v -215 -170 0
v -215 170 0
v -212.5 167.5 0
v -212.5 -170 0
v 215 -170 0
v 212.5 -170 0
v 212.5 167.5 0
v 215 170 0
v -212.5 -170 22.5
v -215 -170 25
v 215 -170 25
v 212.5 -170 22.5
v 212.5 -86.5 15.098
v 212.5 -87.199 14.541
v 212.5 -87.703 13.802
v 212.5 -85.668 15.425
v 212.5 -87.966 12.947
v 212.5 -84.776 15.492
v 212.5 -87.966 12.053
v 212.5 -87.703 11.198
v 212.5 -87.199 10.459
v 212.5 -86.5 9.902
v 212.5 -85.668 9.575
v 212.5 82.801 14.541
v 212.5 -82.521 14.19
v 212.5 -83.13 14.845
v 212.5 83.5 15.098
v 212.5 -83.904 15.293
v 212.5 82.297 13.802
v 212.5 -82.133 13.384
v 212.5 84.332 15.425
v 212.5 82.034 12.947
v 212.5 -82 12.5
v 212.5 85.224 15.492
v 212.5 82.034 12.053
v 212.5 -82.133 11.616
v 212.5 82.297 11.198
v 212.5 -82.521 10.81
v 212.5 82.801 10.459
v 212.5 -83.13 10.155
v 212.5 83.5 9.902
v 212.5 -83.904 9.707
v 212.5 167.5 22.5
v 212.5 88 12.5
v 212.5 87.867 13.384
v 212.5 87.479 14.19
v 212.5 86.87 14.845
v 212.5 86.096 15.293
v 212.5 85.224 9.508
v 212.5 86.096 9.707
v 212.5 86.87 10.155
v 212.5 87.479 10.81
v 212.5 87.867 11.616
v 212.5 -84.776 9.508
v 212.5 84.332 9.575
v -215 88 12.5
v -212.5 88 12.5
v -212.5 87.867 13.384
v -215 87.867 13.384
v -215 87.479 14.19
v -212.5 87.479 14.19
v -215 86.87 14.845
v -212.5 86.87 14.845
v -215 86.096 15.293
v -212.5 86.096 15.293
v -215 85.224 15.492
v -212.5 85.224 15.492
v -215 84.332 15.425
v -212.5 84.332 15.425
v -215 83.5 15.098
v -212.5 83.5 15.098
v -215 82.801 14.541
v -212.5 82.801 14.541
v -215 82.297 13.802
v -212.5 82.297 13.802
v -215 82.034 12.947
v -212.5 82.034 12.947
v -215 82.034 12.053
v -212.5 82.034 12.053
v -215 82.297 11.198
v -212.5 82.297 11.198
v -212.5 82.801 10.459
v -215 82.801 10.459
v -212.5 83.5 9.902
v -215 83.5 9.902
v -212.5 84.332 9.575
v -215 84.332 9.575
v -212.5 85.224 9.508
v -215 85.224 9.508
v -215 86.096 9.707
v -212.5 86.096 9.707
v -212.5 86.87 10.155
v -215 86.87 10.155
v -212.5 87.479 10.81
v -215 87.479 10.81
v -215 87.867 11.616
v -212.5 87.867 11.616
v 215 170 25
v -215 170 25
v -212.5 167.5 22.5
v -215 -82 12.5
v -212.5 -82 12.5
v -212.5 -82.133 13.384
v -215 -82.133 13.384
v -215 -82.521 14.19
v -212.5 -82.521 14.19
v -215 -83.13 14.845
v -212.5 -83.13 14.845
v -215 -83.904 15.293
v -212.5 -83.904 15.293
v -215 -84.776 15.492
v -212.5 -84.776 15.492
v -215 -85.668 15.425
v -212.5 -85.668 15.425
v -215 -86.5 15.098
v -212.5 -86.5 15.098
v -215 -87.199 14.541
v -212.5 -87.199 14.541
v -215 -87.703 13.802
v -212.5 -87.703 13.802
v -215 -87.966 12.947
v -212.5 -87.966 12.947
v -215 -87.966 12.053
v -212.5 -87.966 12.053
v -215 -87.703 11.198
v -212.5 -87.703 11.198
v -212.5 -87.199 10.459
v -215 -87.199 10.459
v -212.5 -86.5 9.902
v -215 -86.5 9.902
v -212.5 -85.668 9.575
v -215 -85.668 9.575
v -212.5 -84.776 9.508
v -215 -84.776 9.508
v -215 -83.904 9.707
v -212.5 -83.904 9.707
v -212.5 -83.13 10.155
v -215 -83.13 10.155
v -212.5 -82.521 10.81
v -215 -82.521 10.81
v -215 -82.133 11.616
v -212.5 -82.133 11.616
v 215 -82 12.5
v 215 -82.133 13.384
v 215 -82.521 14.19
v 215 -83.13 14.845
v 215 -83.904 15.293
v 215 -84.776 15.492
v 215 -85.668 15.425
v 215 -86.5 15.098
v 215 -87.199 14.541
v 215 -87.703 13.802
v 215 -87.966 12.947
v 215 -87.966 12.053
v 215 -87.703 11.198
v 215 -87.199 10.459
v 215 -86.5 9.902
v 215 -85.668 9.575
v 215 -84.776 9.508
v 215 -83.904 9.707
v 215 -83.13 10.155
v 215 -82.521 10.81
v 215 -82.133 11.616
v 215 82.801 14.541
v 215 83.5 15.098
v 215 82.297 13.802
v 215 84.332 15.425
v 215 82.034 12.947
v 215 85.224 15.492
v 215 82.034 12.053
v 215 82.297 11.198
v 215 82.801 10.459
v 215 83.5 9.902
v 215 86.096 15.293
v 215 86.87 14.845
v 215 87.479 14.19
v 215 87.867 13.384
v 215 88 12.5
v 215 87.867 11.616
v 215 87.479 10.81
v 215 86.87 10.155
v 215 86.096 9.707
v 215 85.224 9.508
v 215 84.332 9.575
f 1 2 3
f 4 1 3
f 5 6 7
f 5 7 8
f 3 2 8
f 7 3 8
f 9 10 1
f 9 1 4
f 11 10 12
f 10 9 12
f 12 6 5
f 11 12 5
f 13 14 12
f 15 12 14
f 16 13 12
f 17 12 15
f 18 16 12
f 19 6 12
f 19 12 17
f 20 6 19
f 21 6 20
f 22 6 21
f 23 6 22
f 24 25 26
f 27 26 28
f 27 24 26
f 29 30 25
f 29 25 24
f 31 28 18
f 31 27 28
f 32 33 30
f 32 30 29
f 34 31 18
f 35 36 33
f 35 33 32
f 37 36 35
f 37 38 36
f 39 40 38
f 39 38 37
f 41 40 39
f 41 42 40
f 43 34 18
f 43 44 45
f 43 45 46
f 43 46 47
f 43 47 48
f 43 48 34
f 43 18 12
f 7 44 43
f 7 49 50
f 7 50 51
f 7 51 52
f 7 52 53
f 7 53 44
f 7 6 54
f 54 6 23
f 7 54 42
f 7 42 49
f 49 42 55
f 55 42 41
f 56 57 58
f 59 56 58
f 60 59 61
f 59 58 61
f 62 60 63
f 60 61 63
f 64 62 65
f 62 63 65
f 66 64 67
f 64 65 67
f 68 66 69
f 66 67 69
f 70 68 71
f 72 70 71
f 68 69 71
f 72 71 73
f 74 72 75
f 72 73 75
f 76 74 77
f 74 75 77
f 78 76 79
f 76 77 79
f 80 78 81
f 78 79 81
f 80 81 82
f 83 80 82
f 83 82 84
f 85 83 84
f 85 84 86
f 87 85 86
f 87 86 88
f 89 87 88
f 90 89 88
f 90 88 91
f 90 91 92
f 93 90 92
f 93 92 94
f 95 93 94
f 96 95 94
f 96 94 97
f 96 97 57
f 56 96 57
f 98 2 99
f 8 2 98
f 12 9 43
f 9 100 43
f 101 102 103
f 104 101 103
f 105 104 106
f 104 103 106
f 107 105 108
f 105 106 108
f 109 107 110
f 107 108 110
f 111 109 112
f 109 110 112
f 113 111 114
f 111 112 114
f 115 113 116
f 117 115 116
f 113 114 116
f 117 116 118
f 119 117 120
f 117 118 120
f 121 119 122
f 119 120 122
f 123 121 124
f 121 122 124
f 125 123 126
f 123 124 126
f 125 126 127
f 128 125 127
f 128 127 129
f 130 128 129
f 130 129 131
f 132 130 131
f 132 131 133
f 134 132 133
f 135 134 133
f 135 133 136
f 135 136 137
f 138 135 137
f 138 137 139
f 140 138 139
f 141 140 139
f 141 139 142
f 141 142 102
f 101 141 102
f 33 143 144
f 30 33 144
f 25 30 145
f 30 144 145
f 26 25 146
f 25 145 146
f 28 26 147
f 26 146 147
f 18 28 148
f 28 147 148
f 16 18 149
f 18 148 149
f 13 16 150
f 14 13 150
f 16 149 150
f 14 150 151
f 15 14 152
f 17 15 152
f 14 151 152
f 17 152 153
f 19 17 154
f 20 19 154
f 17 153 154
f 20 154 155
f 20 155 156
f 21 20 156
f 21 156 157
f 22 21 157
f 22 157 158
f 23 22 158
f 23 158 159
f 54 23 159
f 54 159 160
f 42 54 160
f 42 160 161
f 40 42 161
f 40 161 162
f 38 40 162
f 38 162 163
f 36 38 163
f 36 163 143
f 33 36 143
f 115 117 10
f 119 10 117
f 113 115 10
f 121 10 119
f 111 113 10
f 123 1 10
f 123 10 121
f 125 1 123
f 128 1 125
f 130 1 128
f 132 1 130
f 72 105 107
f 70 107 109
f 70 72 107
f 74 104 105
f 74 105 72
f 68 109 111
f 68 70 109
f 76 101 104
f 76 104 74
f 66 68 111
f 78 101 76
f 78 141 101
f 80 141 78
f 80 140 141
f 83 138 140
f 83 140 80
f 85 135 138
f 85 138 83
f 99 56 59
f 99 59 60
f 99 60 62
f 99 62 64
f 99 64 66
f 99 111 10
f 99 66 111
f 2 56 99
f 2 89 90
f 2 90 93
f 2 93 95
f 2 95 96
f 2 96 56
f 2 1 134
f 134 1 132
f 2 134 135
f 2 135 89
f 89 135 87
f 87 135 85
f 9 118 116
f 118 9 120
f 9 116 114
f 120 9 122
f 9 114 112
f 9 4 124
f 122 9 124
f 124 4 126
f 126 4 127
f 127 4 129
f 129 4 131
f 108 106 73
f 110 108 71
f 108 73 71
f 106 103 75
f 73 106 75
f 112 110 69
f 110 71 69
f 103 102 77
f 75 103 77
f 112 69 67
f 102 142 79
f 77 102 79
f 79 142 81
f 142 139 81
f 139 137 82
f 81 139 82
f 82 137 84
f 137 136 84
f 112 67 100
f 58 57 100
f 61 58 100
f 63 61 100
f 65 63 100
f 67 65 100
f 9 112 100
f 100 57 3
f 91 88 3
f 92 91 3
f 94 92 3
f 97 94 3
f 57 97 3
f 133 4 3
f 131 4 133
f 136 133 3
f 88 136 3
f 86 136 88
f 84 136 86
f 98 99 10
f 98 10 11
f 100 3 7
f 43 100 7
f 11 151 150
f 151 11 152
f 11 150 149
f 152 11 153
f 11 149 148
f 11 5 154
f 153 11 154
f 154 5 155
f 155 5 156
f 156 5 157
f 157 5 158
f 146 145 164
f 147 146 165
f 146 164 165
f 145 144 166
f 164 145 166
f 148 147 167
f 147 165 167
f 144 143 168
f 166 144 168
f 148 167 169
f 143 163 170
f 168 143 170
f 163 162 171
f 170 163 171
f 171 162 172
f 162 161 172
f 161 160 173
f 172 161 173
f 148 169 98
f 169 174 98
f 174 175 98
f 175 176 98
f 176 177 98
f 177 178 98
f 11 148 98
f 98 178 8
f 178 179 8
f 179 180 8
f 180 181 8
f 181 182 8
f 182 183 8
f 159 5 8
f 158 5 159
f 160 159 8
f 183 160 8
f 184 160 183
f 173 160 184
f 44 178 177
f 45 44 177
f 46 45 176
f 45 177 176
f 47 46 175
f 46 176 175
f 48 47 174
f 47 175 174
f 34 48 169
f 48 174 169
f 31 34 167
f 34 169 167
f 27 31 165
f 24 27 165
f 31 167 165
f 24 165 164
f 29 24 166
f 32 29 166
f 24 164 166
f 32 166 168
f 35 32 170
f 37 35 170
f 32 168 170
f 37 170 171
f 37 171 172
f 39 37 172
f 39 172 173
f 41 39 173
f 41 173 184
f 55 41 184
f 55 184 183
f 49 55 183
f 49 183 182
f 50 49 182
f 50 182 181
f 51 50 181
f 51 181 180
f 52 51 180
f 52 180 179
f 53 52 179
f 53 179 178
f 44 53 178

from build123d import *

# Parameters (mm, degrees)
F0_W           = 430
F0_H           = 340
F1_DEPTH       = 25
F2_T           = -2.5
F4_D           = 6
F4_DEPTH       = 1000
F4_CBORE_D     = 6
F4_CBORE_DEPTH = 5


with BuildPart() as f1:
    # F0 (on Top) → F1 (new body)
    with BuildSketch(Plane.XY):
        Rectangle(F0_W, F0_H)
    extrude(amount=F1_DEPTH)

    # F2
    f2_openings = [f1.faces().sort_by_distance(p)[0] for p in [
        (0, 0, 0),
        (0, -170, 12.5),
    ]]
    offset(amount=F2_T, openings=f2_openings)

    # F4
    with Locations(Plane(origin=(-215, 0, 0), x_dir=(0, -1, 0), z_dir=(-1, 0, 0))):
        with Locations((-85, 12.5), (85, 12.5)):
            CounterBoreHole(F4_D / 2, F4_CBORE_D / 2, F4_CBORE_DEPTH, depth=F4_DEPTH)


solid = f1.part
